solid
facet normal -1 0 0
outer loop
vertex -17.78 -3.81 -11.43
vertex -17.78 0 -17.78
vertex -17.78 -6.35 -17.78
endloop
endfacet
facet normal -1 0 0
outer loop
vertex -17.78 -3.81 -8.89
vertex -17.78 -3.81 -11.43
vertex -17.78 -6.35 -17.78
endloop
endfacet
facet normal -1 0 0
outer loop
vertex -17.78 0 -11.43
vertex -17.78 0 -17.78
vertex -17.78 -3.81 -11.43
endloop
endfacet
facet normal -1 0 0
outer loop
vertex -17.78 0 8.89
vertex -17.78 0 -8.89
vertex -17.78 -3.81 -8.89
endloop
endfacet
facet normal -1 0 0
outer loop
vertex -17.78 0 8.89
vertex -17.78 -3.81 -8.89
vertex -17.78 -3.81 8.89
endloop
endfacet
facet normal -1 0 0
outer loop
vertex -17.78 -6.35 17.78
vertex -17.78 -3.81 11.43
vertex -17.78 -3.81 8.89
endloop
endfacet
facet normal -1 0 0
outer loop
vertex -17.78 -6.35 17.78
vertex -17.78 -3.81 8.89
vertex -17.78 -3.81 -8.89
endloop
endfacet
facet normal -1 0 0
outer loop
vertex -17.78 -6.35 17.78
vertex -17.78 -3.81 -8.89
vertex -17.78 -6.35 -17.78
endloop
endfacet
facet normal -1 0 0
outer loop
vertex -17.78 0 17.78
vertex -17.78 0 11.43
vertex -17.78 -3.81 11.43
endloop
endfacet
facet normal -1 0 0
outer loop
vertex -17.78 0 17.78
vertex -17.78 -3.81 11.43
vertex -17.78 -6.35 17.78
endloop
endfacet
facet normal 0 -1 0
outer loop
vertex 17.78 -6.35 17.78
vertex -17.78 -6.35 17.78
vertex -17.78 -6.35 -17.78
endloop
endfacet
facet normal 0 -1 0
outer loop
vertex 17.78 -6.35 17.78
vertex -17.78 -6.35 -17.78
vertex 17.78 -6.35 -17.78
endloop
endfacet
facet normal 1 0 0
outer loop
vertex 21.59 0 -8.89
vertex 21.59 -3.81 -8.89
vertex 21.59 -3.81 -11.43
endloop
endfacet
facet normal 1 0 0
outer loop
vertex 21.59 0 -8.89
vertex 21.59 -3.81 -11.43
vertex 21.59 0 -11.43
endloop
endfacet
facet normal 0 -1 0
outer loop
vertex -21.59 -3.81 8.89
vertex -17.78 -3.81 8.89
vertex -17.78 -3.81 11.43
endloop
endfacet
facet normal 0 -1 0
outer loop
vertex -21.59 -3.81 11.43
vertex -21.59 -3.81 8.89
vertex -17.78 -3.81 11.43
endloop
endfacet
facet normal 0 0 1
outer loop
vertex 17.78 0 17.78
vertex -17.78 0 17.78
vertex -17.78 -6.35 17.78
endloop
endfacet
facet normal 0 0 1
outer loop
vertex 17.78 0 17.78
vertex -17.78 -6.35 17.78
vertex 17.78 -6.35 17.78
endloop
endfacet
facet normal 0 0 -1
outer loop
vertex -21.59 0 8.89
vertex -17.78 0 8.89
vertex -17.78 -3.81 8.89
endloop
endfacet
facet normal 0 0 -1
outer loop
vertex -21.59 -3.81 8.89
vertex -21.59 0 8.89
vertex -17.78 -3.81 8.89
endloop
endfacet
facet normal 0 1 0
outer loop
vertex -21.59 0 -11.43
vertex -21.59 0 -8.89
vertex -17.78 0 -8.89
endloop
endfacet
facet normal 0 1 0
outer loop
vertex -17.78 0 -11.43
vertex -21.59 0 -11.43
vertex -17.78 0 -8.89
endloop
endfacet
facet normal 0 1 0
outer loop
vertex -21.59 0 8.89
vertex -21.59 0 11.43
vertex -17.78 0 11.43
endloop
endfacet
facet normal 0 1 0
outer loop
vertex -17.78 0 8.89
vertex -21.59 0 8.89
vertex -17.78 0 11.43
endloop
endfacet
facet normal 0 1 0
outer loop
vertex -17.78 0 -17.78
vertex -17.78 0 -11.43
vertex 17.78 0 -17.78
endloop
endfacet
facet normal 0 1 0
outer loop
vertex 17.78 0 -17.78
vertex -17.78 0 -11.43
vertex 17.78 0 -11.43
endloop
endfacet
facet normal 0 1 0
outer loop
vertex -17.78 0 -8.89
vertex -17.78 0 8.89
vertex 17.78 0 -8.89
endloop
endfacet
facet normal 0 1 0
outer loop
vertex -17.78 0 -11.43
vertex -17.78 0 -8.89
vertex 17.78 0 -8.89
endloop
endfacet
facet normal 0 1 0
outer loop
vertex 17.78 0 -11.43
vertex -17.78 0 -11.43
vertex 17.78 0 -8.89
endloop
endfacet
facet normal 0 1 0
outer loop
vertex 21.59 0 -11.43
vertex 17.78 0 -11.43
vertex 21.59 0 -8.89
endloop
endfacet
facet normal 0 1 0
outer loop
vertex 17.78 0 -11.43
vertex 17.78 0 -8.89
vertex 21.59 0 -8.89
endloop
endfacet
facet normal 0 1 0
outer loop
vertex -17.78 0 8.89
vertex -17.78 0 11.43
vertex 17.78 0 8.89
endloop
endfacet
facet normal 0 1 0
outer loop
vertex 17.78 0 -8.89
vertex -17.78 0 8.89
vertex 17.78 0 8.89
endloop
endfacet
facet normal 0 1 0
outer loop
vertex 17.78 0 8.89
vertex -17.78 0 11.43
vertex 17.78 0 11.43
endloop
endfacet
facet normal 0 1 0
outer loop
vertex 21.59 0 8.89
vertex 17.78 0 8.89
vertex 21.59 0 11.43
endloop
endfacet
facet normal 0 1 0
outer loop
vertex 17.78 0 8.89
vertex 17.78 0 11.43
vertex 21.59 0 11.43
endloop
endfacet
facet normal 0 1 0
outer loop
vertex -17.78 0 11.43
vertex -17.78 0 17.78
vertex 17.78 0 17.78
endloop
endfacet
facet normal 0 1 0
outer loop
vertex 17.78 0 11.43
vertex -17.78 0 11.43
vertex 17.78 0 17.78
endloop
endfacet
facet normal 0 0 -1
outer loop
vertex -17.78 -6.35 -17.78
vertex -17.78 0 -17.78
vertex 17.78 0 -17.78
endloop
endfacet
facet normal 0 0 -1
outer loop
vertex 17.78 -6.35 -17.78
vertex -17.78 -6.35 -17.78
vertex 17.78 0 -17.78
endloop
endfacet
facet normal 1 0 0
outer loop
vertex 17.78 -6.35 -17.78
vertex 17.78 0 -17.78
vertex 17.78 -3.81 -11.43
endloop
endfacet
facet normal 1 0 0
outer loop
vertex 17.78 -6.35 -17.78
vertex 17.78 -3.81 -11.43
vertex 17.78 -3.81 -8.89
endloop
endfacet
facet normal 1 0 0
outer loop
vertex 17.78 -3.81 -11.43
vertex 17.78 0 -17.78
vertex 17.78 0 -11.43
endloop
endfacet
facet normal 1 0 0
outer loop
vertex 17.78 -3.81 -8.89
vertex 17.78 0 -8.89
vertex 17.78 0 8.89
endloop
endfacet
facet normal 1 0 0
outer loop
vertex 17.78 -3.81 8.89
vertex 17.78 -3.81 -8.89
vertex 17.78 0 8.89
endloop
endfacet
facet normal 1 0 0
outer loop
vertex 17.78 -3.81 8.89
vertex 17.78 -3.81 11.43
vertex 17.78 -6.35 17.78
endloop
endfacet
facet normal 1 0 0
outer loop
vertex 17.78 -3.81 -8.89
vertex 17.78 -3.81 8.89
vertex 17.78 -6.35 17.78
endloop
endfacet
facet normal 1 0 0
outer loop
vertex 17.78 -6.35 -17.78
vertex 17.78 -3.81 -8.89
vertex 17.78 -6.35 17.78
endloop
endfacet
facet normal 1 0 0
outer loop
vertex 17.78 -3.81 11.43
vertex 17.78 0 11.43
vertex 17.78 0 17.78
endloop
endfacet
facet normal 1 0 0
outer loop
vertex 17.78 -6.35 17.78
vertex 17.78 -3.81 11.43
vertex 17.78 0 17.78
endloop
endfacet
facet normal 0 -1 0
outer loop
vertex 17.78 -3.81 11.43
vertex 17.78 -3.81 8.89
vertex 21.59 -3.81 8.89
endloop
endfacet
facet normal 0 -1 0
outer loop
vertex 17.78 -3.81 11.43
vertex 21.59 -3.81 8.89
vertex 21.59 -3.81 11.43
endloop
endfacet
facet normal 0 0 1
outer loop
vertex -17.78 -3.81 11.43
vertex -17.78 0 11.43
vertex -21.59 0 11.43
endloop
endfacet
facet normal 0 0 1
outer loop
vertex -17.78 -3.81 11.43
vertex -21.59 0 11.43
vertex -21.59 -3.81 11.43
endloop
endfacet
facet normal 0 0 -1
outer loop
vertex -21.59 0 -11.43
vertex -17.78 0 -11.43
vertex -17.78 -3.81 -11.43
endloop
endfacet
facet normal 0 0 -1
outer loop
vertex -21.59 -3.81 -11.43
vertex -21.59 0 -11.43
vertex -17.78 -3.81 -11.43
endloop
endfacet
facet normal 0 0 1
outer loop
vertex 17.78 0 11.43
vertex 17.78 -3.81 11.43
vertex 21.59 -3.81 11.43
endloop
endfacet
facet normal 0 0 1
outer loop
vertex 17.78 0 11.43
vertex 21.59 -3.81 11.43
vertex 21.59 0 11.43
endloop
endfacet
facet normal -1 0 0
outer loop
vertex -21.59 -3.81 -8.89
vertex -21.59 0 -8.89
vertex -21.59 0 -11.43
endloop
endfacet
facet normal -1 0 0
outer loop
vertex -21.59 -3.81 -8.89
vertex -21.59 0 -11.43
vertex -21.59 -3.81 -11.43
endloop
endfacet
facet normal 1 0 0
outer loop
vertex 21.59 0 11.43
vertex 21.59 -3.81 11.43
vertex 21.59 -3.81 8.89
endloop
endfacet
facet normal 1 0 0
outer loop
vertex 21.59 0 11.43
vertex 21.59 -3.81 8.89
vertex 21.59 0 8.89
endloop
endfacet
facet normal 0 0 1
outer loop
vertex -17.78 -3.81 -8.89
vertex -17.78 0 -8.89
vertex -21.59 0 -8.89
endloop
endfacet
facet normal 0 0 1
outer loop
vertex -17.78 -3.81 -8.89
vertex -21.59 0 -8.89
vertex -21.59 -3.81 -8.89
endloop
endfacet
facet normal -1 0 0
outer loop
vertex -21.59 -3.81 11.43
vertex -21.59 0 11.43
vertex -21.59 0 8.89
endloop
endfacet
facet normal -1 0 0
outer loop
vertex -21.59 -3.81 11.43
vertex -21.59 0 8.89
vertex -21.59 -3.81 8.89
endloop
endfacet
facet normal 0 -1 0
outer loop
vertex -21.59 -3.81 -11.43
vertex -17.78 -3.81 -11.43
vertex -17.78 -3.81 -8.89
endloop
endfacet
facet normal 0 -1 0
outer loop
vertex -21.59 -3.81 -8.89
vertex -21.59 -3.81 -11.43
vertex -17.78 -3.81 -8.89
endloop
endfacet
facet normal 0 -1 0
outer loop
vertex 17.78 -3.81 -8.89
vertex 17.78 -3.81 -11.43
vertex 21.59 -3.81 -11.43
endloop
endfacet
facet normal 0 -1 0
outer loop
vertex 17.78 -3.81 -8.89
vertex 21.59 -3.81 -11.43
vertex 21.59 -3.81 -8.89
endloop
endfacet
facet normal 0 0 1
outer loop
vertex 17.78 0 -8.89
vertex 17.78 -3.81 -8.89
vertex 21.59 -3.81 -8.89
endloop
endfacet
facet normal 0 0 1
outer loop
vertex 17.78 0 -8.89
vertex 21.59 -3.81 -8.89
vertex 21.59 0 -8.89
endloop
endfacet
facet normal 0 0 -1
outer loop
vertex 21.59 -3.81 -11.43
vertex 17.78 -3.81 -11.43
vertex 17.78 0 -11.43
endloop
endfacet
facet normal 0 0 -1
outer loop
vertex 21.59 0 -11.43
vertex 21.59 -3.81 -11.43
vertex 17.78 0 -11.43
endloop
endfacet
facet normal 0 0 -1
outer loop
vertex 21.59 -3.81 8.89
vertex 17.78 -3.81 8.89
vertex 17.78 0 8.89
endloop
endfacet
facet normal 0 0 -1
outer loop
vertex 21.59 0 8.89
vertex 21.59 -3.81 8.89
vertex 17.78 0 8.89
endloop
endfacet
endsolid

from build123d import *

# Parameters (mm, degrees)
F0_W     = 35.56
F0_H     = 35.56
F1_DEPTH = 6.35
F2_W     = 3.81
F2_H     = 2.54
F3_DEPTH = 3.81
F4_W     = 3.81
F4_H     = 2.54
F5_DEPTH = 3.81


with BuildPart() as f1:
    # F0 (on Front) → F1 (new body)
    with BuildSketch(Plane.XZ):
        Rectangle(F0_W, F0_H)
    extrude(amount=F1_DEPTH)

    # F2 (on face) → F3 (join)
    with BuildSketch(Plane.YZ.offset(17.78)):
        with Locations((-1.905, 10.16)):
            Rectangle(F2_W, F2_H)
        with Locations((-1.905, -10.16)):
            Rectangle(F2_W, F2_H)
    extrude(amount=F3_DEPTH)

    # F4 (on face) → F5 (join)
    with BuildSketch(Plane(origin=(-17.78, 0, 0), x_dir=(0, -1, 0), z_dir=(-1, 0, 0))):
        with Locations((1.905, 10.16)):
            Rectangle(F4_W, F4_H)
        with Locations((1.905, -10.16)):
            Rectangle(F4_W, F4_H)
    extrude(amount=F5_DEPTH)


solid = f1.part
